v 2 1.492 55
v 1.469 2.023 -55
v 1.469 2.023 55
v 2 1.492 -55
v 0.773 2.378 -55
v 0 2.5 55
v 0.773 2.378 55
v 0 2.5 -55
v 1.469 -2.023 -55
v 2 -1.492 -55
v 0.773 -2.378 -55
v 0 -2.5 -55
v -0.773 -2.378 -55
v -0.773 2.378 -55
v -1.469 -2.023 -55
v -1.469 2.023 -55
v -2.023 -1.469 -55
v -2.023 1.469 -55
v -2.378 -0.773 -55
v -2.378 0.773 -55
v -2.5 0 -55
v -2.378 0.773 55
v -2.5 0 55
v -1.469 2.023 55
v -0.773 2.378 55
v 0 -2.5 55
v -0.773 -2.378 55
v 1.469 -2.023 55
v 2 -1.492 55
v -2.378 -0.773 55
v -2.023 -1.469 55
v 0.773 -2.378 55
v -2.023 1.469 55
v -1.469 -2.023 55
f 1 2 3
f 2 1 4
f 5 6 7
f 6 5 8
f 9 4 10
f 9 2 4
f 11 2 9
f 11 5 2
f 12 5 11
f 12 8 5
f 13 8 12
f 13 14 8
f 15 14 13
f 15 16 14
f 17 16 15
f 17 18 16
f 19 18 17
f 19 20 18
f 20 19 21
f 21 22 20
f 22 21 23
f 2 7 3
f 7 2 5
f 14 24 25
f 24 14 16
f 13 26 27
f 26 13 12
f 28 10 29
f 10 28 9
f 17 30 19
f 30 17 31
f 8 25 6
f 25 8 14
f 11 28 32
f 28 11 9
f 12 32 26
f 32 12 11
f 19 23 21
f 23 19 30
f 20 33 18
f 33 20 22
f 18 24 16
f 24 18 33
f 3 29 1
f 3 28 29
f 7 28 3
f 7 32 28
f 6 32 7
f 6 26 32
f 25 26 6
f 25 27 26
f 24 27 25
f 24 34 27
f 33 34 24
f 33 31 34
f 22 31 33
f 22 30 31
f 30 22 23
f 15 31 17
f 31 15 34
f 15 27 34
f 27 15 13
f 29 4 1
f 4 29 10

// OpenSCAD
//Autor: Martín Cancio Barrera, UO287561

length = 110;

module VARILLA(){
    difference(){
        cylinder(h = length, d = 5, $fn = 20, center = true);
        
        translate([3,0,0])
        cube([2, 5, length], center = true);
    }
}

VARILLA();
